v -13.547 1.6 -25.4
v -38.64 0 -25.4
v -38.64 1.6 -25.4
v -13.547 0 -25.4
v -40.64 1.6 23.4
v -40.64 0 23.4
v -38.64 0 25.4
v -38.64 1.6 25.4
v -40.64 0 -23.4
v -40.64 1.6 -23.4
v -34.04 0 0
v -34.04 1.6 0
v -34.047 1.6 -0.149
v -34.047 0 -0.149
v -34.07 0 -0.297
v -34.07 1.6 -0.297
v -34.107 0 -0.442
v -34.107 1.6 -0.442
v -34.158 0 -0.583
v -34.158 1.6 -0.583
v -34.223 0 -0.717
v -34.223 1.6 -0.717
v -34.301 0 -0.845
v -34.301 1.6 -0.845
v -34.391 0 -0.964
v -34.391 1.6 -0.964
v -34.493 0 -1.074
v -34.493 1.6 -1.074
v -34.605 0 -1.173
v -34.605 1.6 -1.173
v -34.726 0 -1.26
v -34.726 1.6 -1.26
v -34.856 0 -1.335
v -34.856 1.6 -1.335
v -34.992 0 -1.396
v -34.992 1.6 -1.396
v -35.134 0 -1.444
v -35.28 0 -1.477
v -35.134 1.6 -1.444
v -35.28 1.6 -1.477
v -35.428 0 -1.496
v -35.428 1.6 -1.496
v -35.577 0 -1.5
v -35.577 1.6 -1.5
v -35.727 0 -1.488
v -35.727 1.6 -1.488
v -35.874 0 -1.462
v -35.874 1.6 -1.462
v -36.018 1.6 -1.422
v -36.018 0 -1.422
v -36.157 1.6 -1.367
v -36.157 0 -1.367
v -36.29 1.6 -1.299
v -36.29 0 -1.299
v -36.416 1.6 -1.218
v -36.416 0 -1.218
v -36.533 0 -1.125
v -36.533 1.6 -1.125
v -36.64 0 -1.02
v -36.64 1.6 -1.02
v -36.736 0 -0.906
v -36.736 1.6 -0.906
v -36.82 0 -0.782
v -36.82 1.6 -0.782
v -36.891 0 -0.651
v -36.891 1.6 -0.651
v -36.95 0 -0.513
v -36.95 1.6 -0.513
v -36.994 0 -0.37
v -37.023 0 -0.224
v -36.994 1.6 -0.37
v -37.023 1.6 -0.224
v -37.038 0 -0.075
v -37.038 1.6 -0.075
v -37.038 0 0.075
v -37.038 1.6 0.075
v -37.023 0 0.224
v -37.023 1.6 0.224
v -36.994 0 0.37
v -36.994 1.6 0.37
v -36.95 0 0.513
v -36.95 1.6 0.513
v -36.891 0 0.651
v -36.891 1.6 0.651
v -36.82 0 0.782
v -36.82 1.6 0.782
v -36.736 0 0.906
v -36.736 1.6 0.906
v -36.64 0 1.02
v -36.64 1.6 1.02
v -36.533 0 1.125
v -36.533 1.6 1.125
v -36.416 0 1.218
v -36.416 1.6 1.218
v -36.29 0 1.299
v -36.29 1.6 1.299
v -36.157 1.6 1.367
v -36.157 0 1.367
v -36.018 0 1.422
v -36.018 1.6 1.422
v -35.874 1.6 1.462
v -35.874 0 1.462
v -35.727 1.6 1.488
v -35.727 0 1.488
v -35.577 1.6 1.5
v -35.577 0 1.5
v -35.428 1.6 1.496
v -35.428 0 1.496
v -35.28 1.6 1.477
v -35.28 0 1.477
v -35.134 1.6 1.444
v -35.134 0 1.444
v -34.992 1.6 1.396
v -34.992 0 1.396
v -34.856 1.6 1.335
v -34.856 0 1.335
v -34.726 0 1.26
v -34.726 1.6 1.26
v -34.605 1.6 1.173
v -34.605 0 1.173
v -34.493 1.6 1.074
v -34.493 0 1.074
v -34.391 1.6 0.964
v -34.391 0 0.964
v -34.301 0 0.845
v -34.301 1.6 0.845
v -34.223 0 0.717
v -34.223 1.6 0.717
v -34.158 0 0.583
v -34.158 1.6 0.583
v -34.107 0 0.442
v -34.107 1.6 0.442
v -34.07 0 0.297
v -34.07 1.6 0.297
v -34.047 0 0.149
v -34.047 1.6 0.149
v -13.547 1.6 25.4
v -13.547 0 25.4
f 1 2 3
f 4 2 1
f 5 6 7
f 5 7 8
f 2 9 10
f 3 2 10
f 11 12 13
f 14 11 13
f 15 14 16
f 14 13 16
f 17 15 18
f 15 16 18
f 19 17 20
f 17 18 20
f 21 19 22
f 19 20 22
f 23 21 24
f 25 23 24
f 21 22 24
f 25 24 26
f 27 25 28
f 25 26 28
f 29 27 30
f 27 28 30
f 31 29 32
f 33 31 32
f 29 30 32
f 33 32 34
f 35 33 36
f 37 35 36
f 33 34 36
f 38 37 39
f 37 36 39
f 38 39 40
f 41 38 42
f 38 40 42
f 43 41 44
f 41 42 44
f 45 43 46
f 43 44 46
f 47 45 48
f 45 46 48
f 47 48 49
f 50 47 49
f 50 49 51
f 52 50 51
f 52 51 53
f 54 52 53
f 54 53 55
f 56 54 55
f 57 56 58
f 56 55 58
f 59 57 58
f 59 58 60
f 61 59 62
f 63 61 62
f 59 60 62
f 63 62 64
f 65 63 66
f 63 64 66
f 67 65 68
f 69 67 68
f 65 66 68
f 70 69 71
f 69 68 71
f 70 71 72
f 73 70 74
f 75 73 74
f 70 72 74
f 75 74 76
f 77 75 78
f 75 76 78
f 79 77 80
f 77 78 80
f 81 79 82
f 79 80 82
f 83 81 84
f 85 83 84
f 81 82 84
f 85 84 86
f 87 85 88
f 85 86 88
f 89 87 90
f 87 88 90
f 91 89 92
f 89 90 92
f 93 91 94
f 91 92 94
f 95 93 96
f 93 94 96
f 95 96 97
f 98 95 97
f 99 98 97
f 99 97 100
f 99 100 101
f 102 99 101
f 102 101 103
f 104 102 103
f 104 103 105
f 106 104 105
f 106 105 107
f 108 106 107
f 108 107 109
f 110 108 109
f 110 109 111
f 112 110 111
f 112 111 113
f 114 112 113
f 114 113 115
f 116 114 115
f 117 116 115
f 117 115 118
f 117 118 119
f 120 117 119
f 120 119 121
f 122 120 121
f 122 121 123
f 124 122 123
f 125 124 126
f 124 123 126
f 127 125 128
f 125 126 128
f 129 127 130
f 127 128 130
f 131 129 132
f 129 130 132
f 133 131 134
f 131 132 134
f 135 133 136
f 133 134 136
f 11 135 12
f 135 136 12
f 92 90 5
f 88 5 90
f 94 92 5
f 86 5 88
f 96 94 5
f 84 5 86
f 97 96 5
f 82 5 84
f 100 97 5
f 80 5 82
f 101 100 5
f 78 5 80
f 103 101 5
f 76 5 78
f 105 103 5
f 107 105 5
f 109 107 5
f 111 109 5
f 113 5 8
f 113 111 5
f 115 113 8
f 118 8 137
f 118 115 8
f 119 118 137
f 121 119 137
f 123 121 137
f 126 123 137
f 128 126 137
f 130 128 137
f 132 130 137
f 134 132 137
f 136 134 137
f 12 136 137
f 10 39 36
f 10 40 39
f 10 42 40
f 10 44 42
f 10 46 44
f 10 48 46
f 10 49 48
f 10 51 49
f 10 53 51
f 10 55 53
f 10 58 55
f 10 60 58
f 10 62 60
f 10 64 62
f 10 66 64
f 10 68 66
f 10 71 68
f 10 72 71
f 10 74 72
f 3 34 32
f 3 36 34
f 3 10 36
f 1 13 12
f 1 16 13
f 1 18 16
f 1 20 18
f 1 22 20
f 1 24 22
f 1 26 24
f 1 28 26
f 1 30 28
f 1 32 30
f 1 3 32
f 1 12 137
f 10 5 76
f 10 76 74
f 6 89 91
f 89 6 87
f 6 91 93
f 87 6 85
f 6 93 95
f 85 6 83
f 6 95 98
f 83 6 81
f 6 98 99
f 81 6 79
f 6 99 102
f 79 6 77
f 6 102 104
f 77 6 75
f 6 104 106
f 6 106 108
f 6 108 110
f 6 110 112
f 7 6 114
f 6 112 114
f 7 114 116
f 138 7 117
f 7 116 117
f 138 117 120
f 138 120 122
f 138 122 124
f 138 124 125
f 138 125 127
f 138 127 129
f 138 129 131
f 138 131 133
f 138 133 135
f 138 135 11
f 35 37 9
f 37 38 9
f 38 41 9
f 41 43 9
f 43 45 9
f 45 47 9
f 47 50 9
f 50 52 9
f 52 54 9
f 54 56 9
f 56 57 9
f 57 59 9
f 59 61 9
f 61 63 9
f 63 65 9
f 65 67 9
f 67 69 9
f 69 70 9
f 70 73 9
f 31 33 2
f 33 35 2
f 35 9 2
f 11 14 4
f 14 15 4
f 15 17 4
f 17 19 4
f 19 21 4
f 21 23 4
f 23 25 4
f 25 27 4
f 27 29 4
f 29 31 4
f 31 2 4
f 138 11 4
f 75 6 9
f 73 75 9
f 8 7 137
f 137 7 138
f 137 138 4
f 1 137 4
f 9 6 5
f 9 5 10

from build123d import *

# Parameters (mm, degrees)
SKETCH1_W           = 81.28
SKETCH1_H           = 50.8
BOSS_EXTRUDE1_DEPTH = 1.6002
SKETCH2_R           = 1.5
CUT_EXTRUDE1_DEPTH  = 1.6002
CHAMFER1_SIZE       = 2
CUT_EXTRUDE2_DEPTH  = 10


with BuildPart() as part:
    # Sketch1 → Boss-Extrude1 (new body)
    with BuildSketch(Plane(origin=(0, 0, 0), x_dir=(1, 0, 0), z_dir=(0, 1, 0))):
        Rectangle(SKETCH1_W, SKETCH1_H)
    extrude(amount=BOSS_EXTRUDE1_DEPTH)

    # Sketch2 → Cut-Extrude1 (cut)
    with BuildSketch(Plane(origin=(0, 1.6002, 0), x_dir=(1, 0, 0), z_dir=(0, 1, 0))):
        with Locations((-35.54, 0)):
            Circle(SKETCH2_R)
        with Locations((35.56, 0)):
            Circle(SKETCH2_R)
        Circle(SKETCH2_R)
    extrude(amount=-CUT_EXTRUDE1_DEPTH, mode=Mode.SUBTRACT)

    # Chamfer1
    chamfer1_edges = [part.edges().sort_by_distance(p)[0] for p in [
        (40.64, 0.8001, 25.4),
        (-40.64, 0.8001, 25.4),
        (-40.64, 0.8001, -25.4),
        (40.64, 0.8001, -25.4),
    ]]
    chamfer(chamfer1_edges, length=CHAMFER1_SIZE)

    # Sketch3 → Cut-Extrude2 (cut)
    with BuildSketch(Plane.XZ):
        Polygon((-13.546666667, 25.4), (-13.546666667, -25.4), (38.64, -25.4), (40.64, -23.4), (40.64, 23.4), (38.64, 25.4), align=None)
    extrude(amount=-CUT_EXTRUDE2_DEPTH, mode=Mode.SUBTRACT)


solid = part.part
